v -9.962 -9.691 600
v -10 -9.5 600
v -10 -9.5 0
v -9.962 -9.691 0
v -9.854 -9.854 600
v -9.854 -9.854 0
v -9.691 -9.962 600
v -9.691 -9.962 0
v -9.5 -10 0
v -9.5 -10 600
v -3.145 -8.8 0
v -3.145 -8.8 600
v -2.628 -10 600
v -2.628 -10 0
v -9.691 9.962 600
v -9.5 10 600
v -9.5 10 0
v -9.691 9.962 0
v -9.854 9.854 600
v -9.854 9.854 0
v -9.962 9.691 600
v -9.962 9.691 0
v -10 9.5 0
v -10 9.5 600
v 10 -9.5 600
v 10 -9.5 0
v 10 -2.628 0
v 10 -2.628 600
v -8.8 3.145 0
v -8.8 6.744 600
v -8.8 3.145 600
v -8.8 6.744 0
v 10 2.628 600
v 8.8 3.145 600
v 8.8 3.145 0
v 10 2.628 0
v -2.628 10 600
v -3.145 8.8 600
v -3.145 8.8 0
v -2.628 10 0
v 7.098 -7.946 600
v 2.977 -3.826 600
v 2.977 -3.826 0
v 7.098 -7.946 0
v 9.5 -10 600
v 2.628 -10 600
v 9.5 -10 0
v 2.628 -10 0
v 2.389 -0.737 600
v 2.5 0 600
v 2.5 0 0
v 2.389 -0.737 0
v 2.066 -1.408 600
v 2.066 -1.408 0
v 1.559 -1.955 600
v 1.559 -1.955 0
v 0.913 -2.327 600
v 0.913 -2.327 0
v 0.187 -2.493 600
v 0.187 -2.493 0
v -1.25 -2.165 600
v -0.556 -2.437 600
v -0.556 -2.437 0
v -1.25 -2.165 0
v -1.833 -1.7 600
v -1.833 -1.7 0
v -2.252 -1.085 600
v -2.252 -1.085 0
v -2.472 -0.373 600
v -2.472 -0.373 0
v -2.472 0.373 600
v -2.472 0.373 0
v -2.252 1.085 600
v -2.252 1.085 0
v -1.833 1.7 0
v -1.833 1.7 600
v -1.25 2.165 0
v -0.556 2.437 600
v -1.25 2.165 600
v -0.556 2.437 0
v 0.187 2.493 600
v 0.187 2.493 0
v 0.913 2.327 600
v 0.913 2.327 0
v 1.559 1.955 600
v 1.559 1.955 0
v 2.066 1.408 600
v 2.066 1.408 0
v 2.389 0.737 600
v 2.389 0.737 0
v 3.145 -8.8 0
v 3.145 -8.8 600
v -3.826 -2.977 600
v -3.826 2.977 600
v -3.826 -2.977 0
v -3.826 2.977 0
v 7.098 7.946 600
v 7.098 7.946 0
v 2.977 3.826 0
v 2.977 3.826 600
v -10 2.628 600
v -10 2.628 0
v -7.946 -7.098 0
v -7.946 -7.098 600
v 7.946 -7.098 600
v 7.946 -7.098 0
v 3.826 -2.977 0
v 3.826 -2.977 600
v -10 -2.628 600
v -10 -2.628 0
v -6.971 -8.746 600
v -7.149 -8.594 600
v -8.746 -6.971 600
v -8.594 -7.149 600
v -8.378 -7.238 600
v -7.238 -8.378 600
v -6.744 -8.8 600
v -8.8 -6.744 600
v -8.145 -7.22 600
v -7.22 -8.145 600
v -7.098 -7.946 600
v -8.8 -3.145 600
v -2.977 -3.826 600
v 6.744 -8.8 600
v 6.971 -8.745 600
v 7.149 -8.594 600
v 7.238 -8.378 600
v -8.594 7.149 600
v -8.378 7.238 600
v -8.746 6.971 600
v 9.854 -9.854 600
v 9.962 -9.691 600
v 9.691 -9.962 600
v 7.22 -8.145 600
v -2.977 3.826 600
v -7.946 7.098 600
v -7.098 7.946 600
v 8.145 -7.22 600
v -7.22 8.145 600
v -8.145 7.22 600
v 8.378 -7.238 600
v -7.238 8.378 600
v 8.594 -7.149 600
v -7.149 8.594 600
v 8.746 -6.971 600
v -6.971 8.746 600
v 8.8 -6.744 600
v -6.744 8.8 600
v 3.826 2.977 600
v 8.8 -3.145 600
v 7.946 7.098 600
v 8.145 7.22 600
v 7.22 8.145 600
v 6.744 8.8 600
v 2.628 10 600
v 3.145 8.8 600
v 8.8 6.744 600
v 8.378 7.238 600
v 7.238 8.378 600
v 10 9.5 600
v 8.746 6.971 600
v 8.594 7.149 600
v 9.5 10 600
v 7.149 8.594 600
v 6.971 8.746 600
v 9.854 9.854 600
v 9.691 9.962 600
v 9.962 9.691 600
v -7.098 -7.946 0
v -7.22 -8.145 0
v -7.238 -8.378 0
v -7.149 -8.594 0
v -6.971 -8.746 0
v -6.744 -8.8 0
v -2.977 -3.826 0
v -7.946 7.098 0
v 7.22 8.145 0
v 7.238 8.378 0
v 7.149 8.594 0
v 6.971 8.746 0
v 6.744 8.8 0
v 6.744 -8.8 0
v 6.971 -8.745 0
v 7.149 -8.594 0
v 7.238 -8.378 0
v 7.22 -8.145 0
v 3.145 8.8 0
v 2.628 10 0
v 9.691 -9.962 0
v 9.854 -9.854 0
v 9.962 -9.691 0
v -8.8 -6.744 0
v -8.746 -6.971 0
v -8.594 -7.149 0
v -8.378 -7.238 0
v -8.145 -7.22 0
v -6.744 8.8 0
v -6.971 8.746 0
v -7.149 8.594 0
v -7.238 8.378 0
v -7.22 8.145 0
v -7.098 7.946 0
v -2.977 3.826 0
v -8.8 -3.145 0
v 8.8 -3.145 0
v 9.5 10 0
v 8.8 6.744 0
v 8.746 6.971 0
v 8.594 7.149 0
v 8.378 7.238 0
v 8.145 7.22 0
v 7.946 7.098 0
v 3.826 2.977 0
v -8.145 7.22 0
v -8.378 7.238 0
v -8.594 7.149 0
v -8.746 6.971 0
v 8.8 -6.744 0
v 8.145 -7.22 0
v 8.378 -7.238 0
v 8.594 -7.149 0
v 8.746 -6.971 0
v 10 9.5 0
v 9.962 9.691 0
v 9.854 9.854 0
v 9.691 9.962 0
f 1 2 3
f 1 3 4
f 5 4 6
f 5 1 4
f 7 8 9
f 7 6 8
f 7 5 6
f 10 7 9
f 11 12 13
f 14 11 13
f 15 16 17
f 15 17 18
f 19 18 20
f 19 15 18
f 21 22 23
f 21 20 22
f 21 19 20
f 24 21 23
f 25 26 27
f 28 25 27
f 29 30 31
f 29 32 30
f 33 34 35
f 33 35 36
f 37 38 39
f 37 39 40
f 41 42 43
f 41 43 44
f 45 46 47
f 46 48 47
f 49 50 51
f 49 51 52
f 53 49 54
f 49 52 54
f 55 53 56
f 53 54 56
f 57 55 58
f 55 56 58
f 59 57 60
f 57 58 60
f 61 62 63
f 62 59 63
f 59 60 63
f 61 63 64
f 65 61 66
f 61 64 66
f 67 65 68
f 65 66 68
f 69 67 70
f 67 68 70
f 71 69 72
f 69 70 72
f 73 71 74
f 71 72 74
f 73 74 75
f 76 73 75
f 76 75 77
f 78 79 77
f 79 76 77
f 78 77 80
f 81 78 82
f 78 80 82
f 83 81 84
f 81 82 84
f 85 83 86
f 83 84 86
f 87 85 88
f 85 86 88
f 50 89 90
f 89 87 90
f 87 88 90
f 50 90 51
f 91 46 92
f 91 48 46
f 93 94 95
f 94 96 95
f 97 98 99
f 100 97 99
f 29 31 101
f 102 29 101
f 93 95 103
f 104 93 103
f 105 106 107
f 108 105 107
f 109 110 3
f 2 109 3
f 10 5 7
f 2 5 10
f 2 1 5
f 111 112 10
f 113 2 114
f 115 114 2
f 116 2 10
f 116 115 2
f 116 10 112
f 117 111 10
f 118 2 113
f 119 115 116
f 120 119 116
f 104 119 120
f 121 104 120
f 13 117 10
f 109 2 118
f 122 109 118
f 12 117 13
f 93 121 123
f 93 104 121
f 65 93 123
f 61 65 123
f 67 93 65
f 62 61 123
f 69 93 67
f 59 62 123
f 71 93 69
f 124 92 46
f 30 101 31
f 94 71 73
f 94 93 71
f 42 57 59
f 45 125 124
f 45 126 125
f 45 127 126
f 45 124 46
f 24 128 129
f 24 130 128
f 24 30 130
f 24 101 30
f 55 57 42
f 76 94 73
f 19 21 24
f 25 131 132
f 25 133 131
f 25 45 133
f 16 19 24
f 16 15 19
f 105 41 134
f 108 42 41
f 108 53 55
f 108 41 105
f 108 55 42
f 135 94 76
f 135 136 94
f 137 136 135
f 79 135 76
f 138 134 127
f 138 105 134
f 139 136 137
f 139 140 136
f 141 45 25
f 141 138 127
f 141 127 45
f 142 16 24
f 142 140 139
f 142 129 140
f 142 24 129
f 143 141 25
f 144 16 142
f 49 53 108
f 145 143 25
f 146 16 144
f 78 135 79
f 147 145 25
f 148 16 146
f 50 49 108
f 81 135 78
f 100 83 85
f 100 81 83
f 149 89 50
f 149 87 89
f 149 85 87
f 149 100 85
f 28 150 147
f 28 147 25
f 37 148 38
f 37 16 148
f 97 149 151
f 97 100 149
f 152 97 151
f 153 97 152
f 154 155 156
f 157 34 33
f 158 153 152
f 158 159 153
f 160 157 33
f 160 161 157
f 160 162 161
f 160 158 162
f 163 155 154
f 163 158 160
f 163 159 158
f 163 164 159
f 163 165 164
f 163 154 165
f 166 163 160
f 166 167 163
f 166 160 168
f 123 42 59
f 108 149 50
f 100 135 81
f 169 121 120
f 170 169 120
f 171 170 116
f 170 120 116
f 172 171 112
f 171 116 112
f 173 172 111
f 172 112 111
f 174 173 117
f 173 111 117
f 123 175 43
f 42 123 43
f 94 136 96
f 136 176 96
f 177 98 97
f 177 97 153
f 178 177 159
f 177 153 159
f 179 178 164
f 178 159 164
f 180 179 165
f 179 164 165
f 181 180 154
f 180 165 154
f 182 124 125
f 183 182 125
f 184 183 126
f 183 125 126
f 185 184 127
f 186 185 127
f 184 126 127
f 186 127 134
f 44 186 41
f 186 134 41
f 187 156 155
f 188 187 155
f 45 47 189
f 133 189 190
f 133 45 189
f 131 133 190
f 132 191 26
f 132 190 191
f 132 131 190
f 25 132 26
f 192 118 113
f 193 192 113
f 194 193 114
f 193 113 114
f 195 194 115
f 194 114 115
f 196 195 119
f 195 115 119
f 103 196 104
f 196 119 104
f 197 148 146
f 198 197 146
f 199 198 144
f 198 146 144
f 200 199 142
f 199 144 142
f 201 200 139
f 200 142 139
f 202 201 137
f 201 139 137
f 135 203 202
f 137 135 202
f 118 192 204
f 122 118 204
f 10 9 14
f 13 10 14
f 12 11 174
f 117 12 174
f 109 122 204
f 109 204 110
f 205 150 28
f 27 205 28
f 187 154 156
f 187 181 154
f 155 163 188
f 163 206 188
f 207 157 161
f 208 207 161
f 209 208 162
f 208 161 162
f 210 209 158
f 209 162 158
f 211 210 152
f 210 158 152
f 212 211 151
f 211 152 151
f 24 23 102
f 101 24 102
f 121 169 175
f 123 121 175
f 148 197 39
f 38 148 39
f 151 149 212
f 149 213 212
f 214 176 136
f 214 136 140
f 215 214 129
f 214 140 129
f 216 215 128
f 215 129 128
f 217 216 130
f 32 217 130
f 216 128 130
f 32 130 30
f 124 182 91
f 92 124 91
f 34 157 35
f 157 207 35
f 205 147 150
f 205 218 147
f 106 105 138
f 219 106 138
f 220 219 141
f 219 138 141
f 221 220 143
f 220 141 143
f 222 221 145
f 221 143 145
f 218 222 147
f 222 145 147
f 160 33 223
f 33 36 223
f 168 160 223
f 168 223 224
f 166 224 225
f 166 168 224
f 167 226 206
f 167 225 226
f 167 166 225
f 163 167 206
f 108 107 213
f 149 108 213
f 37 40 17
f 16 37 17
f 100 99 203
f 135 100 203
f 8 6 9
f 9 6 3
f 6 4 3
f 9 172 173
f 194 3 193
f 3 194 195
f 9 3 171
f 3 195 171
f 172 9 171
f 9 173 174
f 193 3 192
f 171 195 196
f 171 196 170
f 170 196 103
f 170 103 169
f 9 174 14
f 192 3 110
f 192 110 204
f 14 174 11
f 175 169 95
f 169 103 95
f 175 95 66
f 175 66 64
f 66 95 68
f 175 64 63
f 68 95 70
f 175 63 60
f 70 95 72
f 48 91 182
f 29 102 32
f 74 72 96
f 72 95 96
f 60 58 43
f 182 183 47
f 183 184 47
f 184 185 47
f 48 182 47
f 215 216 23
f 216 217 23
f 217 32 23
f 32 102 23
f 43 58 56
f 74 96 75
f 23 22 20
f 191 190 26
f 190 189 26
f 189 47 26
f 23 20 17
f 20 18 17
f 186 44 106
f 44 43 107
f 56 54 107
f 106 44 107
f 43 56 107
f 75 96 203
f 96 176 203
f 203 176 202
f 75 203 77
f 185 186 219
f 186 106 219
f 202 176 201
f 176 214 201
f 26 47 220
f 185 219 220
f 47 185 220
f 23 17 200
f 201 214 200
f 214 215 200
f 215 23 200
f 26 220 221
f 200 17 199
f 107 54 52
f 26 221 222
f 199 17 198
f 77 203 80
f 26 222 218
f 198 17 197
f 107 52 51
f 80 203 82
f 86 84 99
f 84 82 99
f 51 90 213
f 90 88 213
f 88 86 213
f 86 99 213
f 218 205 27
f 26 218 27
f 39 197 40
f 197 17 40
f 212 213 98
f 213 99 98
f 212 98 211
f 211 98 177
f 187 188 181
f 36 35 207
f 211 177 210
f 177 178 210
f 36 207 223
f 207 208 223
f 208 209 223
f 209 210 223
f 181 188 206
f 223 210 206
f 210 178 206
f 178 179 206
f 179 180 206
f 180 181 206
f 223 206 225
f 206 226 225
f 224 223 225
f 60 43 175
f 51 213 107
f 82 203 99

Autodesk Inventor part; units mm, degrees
ref_plane "YZ Plane" through (0, 0, 0) normal (1, 0, 0) x (0, 1, 0)
ref_plane "XZ Plane" through (0, 0, 0) normal (0, 1, 0) x (-1, 0, 0)
ref_plane "XY Plane" through (0, 0, 0) normal (0, 0, 1) x (1, 0, 0)
sketch "Sketch1" plane through (0, 0, 0) normal (0, 0, 1) x (1, 0, 0)
  circle A0 centre (0, 0) radius 2.5
  line L0 (2.9774, 3.8259) -> (-2.9774, 3.8259)
  line L1 (-3.8259, 2.9774) -> (-3.8259, -2.9774)
  line L2 (-3.8259, -2.9774) -> (-8.8, -7.9515)
  line L3 (-7.9515, -8.8) -> (-2.9774, -3.8259)
  line L4 (2.9774, -3.8259) -> (7.9515, -8.8)
  line L5 (3.8259, 2.9774) -> (8.8, 7.9515)
  line L6 (8.8, -7.9515) -> (3.8259, -2.9774)
  line L7 (7.9515, 8.8) -> (2.9774, 3.8259)
  line L8 (-2.9774, 3.8259) -> (-7.9515, 8.8)
  line L9 (-8.8, 7.9515) -> (-3.8259, 2.9774)
  line L10 (-2.9774, -3.8259) -> (2.9774, -3.8259)
  line L11 (3.8259, -2.9774) -> (3.8259, 2.9774)
  line L12 (-3.1451, -8.8) -> (-2.6278, -10)
  line L13 (-3.1451, -8.8) -> (-7.9515, -8.8)
  line L14 (-10, -10) -> (-2.6278, -10)
  line L15 (2.6278, -10) -> (10, -10)
  line L16 (7.9515, -8.8) -> (3.1451, -8.7999)
  circle A1 centre (0, 0) radius 3.8259 construction
  line L17 (0, 0) -> (7.0677, 7.0677) construction
  circle A2 centre (2.7053, 2.7053) radius 1.1531 construction
  line L18 (-13.2321, 0) -> (16.76, 0) construction
  circle A3 centre (0, 0) radius 4.848 construction
  line L19 (2.6278, -10) -> (3.1451, -8.7999)
  line L20 (-8.8, -7.9515) -> (-8.8, -3.1451)
  line L21 (-8.8, -3.1451) -> (-10, -2.6278)
  line L22 (-8.8, 7.9515) -> (-8.8, 3.1451)
  line L23 (-8.8, 3.1451) -> (-10, 2.6278)
  line L24 (-7.9515, 8.8) -> (-3.1451, 8.8)
  line L25 (-3.1451, 8.8) -> (-2.6278, 10)
  line L26 (7.9515, 8.8) -> (3.1451, 8.8)
  line L27 (3.1451, 8.8) -> (2.6278, 10)
  line L28 (8.8, 7.9515) -> (8.8, 3.1451)
  line L29 (8.8, 3.1451) -> (10, 2.6278)
  line L30 (8.8, -7.9515) -> (8.8, -3.1451)
  line L31 (8.8, -3.1451) -> (10, -2.6278)
  line L32 (-10, 10) -> (-10, 2.6278)
  line L33 (-10, -2.6278) -> (-10, -10)
  line L34 (10, 10) -> (2.6278, 10)
  line L35 (-2.6278, 10) -> (-10, 10)
  line L36 (10, -10) -> (10, -2.6278)
  line L37 (10, 2.6278) -> (10, 10)
  point P0 (3.8259, 0)
  point P1 (-0.0241, 0)
  point P2 (-3.8259, 0)
  dimension "d0" = 20
  dimension "d1" = 20
  dimension "d2" = 5
  dimension "d3" = 1.2
  dimension "d4" = 1.2
  dimension "d5" = 1.2
  dimension "d6" = 1.2
  dimension "d7" = 20
  dimension "d8" = 1.2
  dimension "d9" = 1.2
  dimension "d10" = 1.2
  dimension "d11" = 1.2
  dimension "d12" = 1.2
  dimension "d13" = 20
extrude "Extrusion1" add sketch "Sketch1" along normal blind 600
fillet "Fillet1" radius 0.5 12 edges at (-10, 10, 300) (-7.9515, 8.8, 300) (-8.8, 7.9515, 300) (-10, -10, 300) (-7.9515, -8.8, 300) (-8.8, -7.9515, 300) (10, -10, 300) (7.9515, -8.8, 300) (8.8, -7.9515, 300) (7.9515, 8.8, 300) (10, 10, 300) (8.8, 7.9515, 300)
properties part number "600 beam"
